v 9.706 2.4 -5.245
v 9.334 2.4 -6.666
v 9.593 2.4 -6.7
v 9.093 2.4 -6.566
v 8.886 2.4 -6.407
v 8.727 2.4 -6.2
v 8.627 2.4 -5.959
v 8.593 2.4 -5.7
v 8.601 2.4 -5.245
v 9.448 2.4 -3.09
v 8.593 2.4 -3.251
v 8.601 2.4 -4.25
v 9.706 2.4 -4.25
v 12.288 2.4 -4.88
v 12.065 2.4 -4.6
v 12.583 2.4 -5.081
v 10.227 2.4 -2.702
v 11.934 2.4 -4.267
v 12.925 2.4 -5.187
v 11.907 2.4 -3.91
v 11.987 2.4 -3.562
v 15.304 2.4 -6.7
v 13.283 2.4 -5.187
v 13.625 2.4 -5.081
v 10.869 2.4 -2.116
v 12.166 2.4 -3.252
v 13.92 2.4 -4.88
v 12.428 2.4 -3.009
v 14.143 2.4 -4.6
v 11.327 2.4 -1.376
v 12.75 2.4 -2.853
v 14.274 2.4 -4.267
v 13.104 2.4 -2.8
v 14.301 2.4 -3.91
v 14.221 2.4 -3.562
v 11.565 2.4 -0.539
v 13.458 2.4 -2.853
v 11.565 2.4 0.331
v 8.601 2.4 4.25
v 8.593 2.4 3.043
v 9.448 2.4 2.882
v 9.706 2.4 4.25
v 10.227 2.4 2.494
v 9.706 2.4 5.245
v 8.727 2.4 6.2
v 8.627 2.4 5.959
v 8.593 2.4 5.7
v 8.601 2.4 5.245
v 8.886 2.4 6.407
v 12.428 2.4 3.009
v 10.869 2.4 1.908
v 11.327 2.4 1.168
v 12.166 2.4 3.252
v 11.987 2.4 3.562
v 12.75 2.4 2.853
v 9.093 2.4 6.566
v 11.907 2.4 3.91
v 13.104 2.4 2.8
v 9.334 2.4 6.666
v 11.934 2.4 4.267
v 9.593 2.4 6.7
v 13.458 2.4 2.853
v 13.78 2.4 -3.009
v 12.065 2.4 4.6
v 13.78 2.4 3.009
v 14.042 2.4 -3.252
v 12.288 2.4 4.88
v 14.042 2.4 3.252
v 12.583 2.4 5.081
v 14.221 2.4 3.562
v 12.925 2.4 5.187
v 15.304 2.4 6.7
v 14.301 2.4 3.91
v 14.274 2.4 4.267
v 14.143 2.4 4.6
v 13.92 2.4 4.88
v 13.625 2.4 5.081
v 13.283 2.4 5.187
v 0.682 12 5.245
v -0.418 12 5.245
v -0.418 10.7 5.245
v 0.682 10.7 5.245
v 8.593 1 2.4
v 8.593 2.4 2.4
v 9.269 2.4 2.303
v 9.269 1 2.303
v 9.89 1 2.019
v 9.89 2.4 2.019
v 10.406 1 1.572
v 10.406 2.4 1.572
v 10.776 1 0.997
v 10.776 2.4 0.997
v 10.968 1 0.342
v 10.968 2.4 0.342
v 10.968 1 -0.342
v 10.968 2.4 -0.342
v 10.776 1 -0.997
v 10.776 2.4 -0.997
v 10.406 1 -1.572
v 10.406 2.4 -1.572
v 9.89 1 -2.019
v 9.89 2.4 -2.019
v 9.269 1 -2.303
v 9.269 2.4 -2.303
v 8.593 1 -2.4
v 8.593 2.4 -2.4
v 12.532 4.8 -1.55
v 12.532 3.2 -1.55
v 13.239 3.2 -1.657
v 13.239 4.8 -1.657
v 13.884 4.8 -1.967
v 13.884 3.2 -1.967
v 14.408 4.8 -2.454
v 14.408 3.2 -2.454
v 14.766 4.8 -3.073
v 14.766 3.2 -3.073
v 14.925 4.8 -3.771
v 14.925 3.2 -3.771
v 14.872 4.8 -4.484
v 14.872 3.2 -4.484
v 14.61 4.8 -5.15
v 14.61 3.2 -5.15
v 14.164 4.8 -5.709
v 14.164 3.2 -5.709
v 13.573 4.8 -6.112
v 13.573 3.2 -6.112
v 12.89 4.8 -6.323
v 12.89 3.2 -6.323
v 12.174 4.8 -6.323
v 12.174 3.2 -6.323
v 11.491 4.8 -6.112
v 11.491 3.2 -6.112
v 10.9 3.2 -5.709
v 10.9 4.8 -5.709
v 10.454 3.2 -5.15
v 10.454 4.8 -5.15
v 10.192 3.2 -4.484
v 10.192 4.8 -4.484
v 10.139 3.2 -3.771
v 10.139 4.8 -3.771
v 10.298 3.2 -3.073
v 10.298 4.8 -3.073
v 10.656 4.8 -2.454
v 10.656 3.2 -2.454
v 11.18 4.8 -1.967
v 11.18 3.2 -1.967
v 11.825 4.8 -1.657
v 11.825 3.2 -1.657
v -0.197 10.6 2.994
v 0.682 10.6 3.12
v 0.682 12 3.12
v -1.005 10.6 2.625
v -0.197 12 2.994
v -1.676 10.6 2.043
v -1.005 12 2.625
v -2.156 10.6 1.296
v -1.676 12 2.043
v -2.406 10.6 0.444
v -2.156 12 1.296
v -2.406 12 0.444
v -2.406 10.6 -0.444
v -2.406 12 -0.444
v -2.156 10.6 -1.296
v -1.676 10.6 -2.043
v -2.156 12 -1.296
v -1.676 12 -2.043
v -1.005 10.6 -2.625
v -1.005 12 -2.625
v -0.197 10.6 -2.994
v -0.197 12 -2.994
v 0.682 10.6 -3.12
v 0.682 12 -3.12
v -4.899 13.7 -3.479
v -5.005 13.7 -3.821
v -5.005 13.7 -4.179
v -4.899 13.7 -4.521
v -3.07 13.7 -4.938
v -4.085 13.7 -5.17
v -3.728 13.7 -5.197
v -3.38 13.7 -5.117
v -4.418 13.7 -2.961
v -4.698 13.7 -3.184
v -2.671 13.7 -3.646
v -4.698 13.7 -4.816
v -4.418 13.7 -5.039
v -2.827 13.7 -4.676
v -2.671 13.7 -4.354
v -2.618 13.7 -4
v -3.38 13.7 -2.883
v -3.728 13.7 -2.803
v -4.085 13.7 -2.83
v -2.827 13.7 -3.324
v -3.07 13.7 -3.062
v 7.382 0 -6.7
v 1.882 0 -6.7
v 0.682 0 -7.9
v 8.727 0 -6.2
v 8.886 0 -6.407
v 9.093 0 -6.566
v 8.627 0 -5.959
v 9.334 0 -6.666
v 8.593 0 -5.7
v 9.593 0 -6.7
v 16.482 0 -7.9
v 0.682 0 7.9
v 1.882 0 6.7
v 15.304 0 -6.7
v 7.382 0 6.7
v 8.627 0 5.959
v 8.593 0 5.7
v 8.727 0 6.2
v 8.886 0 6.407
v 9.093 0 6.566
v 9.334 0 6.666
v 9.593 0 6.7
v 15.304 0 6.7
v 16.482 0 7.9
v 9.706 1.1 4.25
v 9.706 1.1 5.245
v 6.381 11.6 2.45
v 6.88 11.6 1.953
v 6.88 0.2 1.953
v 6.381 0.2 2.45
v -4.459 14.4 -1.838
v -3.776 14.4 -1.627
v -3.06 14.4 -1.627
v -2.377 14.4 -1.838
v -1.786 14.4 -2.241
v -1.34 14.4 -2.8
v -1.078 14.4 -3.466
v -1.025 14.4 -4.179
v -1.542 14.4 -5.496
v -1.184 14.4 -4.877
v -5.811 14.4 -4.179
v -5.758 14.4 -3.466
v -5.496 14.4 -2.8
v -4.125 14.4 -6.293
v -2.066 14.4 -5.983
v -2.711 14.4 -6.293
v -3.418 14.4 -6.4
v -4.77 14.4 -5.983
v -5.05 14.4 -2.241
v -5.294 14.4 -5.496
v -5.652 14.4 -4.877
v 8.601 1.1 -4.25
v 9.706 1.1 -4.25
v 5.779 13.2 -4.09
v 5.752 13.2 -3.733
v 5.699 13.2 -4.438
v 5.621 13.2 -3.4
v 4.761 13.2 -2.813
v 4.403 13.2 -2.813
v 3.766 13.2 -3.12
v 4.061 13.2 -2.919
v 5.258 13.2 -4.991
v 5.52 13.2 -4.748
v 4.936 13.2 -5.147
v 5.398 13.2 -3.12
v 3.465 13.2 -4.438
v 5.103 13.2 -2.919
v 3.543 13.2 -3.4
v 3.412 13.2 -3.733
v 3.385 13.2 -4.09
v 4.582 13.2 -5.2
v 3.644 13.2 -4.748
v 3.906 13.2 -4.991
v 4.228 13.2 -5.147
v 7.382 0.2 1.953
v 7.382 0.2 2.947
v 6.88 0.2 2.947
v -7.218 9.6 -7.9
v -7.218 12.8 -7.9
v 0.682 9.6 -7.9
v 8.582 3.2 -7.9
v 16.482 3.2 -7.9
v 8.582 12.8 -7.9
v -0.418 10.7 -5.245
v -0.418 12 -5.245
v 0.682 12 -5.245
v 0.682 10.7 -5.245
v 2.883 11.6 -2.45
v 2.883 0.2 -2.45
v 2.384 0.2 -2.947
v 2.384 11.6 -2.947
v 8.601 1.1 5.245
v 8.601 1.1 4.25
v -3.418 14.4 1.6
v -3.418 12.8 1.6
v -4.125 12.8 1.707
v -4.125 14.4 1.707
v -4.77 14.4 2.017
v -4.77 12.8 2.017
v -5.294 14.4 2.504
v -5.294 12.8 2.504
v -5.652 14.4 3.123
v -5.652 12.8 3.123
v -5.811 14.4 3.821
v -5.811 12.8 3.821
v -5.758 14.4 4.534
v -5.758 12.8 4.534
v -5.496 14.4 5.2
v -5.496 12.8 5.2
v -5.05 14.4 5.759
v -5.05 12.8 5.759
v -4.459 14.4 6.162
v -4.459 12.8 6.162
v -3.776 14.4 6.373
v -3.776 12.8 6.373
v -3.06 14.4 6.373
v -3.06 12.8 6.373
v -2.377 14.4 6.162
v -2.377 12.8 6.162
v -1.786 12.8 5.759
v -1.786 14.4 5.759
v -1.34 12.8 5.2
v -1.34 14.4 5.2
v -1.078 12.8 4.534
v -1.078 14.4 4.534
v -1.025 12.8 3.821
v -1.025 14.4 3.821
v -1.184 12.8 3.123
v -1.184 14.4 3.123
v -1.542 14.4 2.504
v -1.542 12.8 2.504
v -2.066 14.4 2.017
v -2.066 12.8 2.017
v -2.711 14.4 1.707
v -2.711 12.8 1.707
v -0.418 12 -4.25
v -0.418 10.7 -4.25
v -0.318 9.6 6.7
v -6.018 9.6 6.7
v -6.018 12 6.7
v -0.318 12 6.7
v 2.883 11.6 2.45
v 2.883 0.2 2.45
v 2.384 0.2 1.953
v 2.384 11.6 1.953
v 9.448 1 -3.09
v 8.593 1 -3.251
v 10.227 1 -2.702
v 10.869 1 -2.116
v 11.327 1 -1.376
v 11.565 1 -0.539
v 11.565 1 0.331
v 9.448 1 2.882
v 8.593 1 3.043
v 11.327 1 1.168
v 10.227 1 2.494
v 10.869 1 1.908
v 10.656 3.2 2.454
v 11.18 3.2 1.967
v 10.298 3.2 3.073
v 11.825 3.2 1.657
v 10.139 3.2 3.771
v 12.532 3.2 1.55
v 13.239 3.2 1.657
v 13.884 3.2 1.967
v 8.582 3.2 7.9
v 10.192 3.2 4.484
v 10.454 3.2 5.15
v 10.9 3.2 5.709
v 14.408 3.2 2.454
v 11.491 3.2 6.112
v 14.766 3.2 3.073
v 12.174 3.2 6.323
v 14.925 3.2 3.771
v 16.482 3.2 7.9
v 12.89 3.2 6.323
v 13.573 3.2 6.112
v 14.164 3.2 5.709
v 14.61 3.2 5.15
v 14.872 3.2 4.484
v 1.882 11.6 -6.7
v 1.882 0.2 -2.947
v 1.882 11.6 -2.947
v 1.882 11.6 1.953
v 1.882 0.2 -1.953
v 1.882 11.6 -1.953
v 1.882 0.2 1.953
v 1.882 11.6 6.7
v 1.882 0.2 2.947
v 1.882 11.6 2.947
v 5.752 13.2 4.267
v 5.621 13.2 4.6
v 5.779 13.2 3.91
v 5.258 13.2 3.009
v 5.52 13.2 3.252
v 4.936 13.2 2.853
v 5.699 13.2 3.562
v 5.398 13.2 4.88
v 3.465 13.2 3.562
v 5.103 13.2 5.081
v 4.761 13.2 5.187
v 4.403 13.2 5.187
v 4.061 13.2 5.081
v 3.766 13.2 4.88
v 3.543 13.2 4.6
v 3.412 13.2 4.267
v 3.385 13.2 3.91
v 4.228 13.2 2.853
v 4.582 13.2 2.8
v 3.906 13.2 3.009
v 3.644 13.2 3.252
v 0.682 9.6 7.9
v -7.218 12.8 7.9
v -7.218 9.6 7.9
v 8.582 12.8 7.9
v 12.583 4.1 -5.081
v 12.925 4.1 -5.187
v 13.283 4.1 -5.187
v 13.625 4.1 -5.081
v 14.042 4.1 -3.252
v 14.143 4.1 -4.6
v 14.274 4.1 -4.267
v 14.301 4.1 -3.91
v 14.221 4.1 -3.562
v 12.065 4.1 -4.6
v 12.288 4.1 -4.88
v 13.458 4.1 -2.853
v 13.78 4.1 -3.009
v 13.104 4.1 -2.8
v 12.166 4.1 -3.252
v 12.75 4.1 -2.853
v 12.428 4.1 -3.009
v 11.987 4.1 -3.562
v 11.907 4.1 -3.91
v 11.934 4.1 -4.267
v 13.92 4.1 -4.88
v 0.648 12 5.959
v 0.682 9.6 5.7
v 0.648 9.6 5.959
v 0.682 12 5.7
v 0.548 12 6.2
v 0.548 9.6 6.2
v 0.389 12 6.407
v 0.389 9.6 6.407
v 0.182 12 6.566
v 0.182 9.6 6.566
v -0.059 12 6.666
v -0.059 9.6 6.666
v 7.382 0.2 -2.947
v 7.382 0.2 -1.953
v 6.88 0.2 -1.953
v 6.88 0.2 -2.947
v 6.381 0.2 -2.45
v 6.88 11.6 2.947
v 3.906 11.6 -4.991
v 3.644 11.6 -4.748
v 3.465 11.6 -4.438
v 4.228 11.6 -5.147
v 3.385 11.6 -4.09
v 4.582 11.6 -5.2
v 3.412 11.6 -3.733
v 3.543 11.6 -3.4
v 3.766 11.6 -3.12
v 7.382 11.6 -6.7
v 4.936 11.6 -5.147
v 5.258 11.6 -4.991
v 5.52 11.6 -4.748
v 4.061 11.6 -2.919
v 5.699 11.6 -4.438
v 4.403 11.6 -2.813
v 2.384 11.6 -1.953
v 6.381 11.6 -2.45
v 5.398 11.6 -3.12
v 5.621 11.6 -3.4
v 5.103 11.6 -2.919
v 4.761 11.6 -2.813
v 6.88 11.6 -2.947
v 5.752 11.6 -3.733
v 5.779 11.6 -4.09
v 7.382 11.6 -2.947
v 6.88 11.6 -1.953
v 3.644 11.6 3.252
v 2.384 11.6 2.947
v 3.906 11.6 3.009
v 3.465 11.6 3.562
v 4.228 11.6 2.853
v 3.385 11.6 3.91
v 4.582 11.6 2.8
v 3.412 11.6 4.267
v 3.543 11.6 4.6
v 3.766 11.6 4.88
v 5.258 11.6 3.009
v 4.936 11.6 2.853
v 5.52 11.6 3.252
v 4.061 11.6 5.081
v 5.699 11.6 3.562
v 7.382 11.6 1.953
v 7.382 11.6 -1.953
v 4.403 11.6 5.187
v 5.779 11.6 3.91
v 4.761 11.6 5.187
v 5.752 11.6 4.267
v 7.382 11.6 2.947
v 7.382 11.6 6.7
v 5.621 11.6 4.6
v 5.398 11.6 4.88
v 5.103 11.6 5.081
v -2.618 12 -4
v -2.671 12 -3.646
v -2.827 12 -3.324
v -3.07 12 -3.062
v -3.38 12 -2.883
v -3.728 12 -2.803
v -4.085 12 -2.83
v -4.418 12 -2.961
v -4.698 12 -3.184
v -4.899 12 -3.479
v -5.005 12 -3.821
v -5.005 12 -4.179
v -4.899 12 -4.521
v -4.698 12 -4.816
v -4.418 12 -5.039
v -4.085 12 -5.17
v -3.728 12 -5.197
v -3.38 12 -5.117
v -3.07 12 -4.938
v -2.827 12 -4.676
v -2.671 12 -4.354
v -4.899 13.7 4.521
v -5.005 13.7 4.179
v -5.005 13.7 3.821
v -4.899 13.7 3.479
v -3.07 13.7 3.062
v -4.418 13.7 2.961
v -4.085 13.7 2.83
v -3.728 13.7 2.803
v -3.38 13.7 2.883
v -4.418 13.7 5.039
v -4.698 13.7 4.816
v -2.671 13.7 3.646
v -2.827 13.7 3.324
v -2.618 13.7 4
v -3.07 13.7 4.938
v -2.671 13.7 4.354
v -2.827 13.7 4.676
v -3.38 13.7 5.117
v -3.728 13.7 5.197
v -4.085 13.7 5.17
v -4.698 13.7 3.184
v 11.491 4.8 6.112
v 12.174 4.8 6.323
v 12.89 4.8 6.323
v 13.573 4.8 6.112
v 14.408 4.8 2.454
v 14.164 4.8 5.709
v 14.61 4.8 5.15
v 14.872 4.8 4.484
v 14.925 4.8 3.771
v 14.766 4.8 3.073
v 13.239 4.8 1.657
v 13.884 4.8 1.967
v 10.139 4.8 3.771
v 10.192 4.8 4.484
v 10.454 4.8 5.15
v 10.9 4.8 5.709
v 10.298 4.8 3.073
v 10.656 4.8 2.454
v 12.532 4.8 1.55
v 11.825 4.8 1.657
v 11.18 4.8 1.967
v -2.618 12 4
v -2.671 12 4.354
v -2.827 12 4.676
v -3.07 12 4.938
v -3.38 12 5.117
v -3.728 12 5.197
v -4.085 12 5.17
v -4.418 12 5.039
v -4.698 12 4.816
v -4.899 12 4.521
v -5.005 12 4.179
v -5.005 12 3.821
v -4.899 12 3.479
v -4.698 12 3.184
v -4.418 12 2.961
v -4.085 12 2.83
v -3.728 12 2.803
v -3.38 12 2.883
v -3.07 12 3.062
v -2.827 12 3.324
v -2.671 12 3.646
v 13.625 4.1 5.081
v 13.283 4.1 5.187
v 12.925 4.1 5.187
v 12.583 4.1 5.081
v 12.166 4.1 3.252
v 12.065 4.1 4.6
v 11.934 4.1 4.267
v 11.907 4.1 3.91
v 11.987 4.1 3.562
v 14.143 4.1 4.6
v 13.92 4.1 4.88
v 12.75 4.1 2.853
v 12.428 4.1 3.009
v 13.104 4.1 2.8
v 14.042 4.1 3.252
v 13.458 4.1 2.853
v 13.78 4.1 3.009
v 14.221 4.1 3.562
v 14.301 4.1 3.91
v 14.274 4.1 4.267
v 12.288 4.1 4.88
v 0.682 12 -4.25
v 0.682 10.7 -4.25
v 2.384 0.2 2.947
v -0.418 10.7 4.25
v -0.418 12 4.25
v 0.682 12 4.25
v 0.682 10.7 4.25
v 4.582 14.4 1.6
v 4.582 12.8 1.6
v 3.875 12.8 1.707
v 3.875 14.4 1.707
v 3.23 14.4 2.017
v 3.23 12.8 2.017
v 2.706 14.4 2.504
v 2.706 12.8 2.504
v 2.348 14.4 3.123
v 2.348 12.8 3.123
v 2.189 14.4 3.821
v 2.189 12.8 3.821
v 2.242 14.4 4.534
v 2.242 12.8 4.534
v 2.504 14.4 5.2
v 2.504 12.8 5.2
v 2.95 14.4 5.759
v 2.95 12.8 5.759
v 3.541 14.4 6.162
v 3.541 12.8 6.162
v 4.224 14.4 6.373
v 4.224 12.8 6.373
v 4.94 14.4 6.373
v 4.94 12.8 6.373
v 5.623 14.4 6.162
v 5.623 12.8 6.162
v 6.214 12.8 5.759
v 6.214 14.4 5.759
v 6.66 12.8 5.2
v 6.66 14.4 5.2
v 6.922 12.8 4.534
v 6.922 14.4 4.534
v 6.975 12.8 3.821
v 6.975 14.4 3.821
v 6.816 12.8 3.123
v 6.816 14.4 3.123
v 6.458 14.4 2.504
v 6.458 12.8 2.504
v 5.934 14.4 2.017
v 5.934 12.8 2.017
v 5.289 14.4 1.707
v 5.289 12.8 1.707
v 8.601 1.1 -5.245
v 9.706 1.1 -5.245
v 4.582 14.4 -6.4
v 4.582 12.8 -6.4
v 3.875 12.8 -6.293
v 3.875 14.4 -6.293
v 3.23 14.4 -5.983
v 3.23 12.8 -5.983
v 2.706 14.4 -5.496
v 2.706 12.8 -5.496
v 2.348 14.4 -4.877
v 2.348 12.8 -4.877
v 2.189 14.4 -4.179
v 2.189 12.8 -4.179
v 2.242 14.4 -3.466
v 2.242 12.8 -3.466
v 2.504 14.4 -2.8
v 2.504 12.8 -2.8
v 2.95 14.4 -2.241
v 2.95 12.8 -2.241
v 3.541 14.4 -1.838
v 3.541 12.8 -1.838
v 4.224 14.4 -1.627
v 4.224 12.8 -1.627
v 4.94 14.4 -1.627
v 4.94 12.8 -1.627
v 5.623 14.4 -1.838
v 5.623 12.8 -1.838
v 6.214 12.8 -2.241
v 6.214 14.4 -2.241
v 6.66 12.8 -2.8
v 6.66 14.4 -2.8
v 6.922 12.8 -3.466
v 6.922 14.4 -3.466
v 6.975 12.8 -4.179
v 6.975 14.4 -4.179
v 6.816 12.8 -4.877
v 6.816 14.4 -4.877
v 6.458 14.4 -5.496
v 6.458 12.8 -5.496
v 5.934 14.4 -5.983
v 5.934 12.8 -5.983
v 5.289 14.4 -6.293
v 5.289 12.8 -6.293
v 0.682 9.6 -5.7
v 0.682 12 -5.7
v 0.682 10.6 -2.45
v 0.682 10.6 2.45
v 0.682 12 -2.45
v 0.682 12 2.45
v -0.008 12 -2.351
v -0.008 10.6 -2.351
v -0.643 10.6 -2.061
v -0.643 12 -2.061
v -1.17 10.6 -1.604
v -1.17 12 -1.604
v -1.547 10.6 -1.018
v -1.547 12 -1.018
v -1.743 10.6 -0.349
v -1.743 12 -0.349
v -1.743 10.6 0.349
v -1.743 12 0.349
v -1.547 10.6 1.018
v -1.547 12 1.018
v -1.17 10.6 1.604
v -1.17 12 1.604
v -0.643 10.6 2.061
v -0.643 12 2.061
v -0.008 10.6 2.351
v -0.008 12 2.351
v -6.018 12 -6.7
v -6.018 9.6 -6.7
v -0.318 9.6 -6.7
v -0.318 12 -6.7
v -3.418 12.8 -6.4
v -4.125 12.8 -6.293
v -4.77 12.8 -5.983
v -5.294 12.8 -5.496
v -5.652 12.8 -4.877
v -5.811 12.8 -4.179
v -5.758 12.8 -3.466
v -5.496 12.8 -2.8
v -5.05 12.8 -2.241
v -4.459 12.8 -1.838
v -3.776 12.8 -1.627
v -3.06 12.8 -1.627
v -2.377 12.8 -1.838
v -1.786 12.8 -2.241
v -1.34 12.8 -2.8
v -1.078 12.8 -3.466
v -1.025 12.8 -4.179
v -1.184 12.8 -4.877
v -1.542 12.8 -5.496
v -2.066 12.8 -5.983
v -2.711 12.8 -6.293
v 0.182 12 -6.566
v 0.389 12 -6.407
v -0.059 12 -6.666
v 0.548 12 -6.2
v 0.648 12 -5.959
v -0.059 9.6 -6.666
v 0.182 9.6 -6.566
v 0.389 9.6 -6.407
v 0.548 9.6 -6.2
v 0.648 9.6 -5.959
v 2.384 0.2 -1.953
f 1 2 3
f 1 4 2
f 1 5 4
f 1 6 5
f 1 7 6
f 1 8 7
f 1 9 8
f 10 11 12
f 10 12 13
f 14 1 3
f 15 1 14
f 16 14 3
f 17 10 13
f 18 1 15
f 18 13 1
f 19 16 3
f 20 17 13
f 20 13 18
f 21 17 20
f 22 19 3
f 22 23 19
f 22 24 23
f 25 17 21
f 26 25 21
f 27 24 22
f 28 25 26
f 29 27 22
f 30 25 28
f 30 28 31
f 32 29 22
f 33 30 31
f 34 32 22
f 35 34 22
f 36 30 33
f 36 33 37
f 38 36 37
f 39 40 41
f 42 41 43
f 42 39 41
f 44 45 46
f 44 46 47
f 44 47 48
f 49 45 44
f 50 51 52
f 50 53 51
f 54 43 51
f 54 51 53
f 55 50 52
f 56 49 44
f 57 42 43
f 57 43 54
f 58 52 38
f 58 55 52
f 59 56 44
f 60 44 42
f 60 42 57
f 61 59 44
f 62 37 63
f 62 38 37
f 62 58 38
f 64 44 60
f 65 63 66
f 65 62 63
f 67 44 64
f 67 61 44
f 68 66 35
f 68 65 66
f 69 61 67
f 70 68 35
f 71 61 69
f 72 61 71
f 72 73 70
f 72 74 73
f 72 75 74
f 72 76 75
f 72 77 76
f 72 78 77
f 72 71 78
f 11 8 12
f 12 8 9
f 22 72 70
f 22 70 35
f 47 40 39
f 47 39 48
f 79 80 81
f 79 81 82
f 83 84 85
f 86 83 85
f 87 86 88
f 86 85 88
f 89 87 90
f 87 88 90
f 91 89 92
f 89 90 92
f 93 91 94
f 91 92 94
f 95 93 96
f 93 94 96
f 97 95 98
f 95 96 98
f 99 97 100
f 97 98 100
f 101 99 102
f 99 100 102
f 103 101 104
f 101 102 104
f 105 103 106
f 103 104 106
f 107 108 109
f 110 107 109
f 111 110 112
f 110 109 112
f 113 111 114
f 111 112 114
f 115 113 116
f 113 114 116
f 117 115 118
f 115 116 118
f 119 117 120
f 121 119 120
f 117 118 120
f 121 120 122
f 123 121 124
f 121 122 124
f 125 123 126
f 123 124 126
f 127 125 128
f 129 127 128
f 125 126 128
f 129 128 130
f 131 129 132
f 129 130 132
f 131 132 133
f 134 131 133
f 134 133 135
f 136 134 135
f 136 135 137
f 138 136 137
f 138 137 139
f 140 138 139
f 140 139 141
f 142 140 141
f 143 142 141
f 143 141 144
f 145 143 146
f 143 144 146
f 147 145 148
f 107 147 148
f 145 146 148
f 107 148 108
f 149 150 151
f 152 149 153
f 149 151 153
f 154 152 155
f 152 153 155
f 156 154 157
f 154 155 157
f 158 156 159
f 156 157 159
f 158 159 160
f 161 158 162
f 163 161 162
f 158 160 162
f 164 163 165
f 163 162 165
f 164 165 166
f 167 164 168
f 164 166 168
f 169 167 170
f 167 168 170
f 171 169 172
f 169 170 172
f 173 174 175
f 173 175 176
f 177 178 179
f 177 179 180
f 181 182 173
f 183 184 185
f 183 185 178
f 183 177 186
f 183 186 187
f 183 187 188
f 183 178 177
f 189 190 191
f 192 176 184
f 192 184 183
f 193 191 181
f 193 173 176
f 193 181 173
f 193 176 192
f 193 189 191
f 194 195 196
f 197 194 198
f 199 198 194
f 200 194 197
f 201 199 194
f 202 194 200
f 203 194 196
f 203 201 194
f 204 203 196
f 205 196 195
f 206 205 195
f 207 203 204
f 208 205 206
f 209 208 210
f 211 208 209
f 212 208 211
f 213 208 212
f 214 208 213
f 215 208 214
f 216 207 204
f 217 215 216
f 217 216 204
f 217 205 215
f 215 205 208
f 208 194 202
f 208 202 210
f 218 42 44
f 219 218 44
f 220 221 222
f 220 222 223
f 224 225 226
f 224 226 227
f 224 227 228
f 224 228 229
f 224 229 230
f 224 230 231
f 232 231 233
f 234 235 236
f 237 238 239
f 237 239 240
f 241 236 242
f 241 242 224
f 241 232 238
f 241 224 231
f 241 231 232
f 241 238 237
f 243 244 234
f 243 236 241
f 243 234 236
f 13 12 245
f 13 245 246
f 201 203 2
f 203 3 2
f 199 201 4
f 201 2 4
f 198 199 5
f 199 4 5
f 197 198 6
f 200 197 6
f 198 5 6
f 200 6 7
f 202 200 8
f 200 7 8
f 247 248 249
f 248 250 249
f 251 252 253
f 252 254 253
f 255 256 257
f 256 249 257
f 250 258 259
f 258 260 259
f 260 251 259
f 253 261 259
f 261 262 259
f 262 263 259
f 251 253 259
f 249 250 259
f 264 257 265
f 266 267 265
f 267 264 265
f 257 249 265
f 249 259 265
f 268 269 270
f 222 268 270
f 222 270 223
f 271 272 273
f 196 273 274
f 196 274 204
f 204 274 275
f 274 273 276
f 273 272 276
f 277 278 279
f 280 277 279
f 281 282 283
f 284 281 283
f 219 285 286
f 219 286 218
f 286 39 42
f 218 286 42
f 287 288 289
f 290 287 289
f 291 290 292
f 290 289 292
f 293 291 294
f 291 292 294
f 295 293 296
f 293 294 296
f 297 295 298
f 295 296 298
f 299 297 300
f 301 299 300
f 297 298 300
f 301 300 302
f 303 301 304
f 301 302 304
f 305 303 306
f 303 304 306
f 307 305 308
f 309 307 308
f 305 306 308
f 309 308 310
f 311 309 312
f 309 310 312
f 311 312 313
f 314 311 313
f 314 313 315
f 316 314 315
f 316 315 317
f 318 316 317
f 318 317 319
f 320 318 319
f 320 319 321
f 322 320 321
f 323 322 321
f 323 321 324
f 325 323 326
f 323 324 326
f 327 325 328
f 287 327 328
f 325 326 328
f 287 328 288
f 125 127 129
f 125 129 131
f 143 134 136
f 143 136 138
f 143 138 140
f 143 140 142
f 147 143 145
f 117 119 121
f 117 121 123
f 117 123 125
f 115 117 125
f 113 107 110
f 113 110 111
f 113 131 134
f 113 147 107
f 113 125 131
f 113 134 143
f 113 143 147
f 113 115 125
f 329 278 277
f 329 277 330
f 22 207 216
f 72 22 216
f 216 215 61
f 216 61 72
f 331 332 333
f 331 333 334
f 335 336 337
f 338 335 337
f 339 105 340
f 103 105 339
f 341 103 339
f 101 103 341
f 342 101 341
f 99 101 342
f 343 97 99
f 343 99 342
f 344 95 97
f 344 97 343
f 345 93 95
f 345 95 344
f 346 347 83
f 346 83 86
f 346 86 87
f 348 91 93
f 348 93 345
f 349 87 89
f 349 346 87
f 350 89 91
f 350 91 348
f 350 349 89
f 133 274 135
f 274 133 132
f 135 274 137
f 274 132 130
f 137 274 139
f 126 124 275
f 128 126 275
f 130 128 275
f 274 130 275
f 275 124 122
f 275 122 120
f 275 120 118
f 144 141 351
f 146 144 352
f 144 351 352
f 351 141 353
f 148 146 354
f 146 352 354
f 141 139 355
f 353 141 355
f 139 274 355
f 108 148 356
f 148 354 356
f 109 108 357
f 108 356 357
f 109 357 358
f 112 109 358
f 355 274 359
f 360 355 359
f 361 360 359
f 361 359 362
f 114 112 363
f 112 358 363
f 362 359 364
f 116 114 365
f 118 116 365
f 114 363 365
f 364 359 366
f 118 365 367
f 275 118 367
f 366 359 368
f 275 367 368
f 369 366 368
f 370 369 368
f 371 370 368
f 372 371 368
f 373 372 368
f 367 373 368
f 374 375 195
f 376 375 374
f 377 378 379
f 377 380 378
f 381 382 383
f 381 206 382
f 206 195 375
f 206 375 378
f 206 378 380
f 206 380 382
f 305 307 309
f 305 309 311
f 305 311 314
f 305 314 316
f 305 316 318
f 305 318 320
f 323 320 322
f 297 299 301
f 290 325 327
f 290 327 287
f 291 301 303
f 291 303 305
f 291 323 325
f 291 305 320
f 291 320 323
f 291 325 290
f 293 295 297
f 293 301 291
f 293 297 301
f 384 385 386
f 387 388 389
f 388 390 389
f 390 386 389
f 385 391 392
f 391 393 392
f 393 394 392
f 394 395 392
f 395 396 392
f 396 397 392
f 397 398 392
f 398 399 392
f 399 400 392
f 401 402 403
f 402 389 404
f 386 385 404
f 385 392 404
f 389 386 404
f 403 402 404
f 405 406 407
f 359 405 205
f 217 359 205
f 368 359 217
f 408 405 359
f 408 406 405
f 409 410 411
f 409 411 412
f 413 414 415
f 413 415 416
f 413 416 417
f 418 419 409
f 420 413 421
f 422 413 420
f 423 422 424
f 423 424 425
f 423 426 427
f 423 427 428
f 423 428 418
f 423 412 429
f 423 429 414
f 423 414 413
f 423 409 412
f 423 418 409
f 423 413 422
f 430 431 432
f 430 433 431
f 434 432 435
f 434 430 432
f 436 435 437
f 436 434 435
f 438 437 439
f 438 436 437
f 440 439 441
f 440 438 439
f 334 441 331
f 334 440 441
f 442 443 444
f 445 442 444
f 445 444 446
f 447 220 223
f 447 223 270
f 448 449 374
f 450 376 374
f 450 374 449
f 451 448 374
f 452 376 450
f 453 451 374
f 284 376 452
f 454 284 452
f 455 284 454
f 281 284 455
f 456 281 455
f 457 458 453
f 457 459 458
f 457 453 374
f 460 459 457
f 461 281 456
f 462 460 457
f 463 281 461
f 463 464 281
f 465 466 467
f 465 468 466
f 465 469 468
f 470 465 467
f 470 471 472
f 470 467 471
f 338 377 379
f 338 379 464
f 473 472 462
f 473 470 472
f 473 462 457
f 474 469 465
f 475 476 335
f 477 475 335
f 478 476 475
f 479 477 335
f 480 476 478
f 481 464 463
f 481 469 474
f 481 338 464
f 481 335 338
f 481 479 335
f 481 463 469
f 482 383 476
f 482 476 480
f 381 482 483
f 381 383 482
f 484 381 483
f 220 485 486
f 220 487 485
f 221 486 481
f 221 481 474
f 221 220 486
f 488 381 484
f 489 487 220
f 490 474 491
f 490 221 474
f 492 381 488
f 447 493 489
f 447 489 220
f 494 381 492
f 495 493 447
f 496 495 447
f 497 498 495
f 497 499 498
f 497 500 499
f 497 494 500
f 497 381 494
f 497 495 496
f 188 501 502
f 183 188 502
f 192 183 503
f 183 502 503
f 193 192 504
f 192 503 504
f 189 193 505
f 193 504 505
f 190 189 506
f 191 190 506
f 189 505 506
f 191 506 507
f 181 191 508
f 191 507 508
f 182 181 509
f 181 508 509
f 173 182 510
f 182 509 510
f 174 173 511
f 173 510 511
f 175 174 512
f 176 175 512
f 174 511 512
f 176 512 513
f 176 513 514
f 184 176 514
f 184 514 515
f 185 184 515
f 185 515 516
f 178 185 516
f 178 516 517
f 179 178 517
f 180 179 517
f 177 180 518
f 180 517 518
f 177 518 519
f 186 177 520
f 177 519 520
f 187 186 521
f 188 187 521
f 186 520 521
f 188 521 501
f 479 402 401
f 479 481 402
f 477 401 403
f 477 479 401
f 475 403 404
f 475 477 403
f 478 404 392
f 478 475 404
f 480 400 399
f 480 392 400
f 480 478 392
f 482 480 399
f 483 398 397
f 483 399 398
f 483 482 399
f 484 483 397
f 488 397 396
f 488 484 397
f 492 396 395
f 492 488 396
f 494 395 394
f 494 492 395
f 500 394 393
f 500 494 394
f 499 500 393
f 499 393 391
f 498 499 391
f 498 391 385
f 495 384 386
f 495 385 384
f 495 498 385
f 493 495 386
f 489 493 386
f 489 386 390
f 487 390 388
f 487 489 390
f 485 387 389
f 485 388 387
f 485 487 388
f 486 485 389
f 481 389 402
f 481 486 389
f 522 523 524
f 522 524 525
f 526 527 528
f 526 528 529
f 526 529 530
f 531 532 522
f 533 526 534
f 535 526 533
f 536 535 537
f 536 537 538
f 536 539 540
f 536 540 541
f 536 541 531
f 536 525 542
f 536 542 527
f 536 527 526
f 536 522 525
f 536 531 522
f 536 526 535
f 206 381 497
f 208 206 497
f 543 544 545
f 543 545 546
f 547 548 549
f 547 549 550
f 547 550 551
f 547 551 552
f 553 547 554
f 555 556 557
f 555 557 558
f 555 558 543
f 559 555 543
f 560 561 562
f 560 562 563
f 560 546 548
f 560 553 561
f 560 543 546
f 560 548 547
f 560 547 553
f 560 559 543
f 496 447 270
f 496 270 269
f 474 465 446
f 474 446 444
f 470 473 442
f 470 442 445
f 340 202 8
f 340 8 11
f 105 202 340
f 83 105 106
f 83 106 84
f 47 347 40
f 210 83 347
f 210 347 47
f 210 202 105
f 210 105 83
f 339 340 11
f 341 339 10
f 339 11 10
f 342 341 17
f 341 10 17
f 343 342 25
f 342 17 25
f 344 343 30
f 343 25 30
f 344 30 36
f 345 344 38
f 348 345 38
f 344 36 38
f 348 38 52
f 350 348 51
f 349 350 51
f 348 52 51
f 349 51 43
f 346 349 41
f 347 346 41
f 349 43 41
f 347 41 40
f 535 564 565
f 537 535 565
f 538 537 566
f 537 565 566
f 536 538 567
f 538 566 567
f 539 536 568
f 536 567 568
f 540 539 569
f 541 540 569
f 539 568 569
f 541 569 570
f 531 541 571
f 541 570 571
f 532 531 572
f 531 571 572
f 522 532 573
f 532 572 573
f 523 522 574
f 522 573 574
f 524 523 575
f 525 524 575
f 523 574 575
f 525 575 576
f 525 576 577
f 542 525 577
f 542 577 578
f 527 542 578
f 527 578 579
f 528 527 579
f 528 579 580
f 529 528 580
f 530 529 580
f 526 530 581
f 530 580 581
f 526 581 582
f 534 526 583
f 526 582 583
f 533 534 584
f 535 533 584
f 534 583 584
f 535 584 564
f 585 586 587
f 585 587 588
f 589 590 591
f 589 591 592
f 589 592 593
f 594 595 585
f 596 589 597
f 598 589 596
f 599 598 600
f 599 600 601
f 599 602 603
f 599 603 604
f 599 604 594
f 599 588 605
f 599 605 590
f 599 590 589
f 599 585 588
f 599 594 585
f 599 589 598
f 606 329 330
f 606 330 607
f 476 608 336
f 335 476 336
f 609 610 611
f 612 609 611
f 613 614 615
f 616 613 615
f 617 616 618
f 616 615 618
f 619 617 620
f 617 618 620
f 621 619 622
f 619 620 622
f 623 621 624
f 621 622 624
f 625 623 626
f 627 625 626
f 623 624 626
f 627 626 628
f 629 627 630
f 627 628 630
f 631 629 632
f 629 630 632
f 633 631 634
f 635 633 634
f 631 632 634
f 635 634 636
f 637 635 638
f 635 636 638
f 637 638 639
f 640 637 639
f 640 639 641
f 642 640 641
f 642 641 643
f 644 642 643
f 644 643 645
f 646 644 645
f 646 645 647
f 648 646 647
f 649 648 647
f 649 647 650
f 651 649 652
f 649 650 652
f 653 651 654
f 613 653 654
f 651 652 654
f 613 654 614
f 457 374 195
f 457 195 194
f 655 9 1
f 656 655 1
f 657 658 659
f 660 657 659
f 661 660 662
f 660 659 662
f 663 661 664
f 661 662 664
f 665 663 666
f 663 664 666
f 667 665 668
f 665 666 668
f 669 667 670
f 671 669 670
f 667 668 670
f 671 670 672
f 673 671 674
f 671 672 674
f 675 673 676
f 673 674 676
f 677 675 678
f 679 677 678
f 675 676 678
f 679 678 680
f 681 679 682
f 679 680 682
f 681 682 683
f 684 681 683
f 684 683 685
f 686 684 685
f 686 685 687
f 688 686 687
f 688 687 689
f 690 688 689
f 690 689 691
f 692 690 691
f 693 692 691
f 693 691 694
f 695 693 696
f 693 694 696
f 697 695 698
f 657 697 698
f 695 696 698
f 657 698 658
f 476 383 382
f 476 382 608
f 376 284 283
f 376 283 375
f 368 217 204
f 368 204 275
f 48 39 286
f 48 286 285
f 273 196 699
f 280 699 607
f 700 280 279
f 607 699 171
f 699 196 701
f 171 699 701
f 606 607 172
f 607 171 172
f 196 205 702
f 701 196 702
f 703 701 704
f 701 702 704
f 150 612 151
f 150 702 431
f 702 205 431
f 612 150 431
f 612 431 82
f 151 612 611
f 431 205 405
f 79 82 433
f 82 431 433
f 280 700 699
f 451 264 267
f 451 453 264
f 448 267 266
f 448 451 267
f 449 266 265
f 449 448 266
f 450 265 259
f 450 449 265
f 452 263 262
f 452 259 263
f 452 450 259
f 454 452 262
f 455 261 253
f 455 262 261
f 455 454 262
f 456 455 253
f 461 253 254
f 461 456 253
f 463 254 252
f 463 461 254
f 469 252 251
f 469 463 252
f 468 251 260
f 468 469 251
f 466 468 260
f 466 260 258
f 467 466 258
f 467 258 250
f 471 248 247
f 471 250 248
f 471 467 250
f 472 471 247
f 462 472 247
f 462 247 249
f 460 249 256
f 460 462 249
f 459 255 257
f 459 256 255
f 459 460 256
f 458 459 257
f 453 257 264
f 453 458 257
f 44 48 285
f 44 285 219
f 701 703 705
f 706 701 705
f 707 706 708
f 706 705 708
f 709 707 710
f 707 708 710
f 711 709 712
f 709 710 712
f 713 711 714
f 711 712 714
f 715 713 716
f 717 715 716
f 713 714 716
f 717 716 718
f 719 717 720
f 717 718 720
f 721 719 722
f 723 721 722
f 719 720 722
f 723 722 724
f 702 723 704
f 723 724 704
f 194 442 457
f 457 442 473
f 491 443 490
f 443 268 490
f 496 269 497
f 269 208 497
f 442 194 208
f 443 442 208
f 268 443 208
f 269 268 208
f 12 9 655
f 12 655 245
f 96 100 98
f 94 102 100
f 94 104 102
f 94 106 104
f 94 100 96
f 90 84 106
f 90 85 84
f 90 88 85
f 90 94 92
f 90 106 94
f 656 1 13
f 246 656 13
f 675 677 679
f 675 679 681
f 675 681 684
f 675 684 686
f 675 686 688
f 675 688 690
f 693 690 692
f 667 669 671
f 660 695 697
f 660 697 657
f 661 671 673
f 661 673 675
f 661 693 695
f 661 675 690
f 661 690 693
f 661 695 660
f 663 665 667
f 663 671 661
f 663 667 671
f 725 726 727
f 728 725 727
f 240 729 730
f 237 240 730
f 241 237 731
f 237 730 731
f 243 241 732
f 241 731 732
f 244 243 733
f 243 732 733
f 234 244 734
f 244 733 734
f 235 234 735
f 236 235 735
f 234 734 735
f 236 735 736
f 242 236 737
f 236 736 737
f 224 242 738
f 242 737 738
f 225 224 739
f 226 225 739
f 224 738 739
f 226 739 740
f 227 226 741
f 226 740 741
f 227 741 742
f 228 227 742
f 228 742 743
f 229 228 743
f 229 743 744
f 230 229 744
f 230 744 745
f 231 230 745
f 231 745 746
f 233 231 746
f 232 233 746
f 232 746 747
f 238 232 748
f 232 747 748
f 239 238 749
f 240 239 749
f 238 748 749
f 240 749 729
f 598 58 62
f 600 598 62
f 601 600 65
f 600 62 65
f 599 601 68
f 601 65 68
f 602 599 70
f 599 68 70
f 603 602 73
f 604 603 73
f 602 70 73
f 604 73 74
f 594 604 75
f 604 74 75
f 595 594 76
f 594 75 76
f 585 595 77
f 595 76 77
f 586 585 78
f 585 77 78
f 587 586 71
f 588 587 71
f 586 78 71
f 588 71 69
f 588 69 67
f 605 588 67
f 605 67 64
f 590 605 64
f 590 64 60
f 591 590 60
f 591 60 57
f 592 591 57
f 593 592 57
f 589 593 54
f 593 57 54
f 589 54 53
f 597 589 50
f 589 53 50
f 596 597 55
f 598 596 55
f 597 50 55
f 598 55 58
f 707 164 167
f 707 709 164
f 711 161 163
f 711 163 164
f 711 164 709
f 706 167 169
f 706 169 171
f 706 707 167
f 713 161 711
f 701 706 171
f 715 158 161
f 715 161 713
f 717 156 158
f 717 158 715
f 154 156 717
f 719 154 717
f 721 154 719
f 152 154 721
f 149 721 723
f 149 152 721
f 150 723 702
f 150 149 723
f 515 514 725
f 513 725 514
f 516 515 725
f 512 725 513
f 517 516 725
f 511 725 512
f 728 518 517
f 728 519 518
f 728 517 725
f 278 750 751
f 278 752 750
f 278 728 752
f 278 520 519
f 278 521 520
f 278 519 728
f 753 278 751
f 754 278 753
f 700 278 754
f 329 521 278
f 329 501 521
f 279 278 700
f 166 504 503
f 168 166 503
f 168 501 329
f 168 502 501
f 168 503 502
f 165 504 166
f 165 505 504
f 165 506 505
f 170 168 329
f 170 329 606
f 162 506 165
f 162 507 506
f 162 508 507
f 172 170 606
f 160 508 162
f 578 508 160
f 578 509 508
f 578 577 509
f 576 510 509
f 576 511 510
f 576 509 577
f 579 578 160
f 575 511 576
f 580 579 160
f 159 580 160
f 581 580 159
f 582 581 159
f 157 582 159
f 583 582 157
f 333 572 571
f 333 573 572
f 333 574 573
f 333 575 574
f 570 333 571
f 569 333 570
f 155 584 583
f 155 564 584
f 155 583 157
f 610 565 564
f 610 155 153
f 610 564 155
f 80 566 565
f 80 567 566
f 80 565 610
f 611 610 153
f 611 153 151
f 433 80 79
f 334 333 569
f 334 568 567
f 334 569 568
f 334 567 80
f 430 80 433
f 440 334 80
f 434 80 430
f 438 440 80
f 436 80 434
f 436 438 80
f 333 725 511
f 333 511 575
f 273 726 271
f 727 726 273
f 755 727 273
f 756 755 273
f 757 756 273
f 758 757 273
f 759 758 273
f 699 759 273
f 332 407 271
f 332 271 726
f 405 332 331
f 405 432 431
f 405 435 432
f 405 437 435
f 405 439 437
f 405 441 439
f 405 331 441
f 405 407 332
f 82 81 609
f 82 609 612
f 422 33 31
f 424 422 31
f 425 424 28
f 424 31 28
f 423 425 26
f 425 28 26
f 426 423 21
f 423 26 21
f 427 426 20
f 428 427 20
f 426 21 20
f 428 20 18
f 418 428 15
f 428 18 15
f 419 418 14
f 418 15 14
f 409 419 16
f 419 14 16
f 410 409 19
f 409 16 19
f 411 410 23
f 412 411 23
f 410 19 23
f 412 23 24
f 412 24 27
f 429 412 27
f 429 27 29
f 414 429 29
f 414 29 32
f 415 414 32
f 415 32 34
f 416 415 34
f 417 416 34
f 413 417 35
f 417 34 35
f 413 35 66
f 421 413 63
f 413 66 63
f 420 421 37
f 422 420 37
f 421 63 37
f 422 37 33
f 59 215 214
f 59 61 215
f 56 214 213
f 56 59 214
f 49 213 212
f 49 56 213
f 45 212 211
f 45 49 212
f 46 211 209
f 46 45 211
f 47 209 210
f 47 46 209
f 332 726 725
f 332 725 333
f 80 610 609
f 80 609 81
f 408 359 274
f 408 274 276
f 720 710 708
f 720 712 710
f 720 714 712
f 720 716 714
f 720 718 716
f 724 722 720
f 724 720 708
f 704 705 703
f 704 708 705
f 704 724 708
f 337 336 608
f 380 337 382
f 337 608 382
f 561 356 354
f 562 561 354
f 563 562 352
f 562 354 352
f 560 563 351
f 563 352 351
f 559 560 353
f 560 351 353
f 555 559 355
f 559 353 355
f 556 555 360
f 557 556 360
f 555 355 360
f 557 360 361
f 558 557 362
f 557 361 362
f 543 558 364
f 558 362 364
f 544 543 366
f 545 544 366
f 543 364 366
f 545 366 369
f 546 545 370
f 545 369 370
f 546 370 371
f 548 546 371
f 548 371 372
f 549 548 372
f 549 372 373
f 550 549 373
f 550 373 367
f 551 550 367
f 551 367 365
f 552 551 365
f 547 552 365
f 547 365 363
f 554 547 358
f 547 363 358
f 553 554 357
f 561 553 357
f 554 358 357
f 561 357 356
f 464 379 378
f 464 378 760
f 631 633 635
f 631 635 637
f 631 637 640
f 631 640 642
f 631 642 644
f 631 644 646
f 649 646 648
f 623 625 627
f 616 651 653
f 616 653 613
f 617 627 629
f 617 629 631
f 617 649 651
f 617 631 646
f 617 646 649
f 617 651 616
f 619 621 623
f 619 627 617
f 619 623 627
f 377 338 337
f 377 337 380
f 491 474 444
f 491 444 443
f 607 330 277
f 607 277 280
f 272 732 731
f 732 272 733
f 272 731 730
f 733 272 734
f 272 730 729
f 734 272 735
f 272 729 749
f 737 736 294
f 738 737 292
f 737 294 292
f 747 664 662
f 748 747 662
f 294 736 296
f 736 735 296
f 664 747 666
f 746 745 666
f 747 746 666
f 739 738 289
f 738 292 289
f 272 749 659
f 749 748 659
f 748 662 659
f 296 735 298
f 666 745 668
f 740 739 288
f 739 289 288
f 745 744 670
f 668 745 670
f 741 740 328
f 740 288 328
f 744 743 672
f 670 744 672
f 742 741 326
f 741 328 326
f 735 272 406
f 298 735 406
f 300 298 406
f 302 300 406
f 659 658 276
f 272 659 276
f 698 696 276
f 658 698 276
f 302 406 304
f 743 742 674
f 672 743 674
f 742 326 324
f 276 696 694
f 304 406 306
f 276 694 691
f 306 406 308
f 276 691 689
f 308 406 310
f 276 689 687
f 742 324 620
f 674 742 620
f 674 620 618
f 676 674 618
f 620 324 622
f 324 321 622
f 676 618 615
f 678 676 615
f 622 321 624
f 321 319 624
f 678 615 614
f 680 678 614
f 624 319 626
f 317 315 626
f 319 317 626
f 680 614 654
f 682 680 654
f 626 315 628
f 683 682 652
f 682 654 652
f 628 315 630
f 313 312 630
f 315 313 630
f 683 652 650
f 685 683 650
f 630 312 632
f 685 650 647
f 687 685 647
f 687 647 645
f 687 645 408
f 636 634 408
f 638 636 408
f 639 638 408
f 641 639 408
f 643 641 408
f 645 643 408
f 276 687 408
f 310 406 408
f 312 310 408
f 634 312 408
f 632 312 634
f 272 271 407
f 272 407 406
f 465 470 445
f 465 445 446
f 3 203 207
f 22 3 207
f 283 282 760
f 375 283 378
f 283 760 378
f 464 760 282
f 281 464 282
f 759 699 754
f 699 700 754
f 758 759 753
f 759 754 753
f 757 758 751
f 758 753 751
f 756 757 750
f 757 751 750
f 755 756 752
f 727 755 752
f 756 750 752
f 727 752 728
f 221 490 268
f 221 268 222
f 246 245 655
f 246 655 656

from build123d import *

# Parameters (mm, degrees)
MAINBASESKETCH_W                = 7.9
MAINBASESKETCH_H                = 12.8
MAINBASEEXTRUDE_DEPTH           = 7.9
STUDSSKETCH_R                   = 2.4
STUDSEXTRUDE_DEPTH              = 1.6
STUDSPATTERN_COUNT              = 2
STUDSPATTERN_PITCH              = 8
MAINBASESHELL_T                 = -1.2
SLIMYELLOWUNDEREXT_START        = -0.2
SLIMYELLOWUNDEREXT_DEPTH        = 11.6
ZIGZAGSKETCH_W                  = 7.9
ZIGZAGSKETCH_H                  = 3.2
ZIGZAGBLUEEXT_DEPTH             = 15.8
LPATTERN1_COUNT                 = 2
LPATTERN1_PITCH                 = 8
LPATTERN1_COPY_1_SKETCH_R       = 2.4
LPATTERN1_COPY_1_DEPTH          = 1.6
ZIGZAGSTUDSKETCH_R              = 2.4
ADDEDSTUDSZIGZAG_DEPTH          = 1.6
CUTUSEDASSHELLSKETCH_W          = 6.71130504
CUTUSEDASSHELLSKETCH_H          = 13.400349982
CUTUSEDASSHELL_DEPTH            = 2.4
ZIGZAGUNDERSTUDSSKETCH_R        = 1.2
ZIGZAGUNDERSTUDHOLES_DEPTH      = 1.7
ZIGZAGUNDERSEMICIRCLEEXT_START  = -0.2
ZIGZAGUNDERSEMICIRCLEEXT_DEPTH  = 1.6
CUTUSEDASSHELLSKETCH2_W         = 6.7
CUTUSEDASSHELLSKETCH2_H         = 13.4
CUTUSEDASSHELL2_DEPTH           = 2.4
ZIGZAGUNDERSEMICEXT2_START      = -0.2
ZIGZAGUNDERSEMICEXT2_DEPTH      = 1.6
ZIGZAGINSIDECORNER1_R           = 1
ZIGZAGINSIDECORNER2_R           = 1
ZIGZAGUNDERSTUDSKETCH2_R        = 1.2
CUT_EXTRUDE1_DEPTH              = 1.7
RECTANGULARUNDEREXTRUDES1_START = -0.2
RECTANGULAREXTSKETCH_W          = 1.100347559
RECTANGULAREXTSKETCH_H          = 0.995198726
RECTANGULARUNDEREXTRUDES1_DEPTH = 1.5
RECTANGULARUNDEREXTRUDES2_START = -0.2
RECTANGULARUNDEREXTSKETCH2_W    = 1.105292793
RECTANGULARUNDEREXTSKETCH2_H    = 0.995198726
RECTANGULARUNDEREXTRUDES2_DEPTH = 1.5


with BuildPart() as part:
    # MainBaseSketch → MainBaseExtrude (new, symmetric)
    with BuildSketch(Plane.XY):
        with Locations((4.631967213, 6.4)):
            Rectangle(MAINBASESKETCH_W, MAINBASESKETCH_H)
    extrude(amount=MAINBASEEXTRUDE_DEPTH, both=True)

    # StudsSketch → StudsExtrude (add)
    with BuildSketch(Plane(origin=(0, 12.8, 0), x_dir=(1, 0, 0), z_dir=(0, 1, 0))):
        with Locations(Location((4.581967213, 4, 0), (0, 0, 90))):
            Circle(STUDSSKETCH_R)
    studsextrude = extrude(amount=STUDSEXTRUDE_DEPTH)

    # StudsPattern: StudsExtrude ×2
    with Locations(*[(0, 0, i * STUDSPATTERN_PITCH) for i in range(1, STUDSPATTERN_COUNT)]):
        add(studsextrude)

    # MainBaseShell
    mainbaseshell_openings = [part.faces().sort_by_distance(p)[0] for p in [
        (4.631967213, 0, 0),
    ]]
    offset(amount=MAINBASESHELL_T, openings=mainbaseshell_openings, kind=Kind.INTERSECTION)

    # SlimYellowUnderExtSketch → SlimYellowUnderExt (add)
    with BuildSketch(Plane.XZ.offset(-11.6).offset(SLIMYELLOWUNDEREXT_START)):
        Polygon((1.881967213, 1.952811318), (1.881967213, 2.947188682), (2.384104441, 2.947188682), (2.882626102, 2.45), (2.384104441, 1.952811318), align=None)
        Polygon((6.381308324, 2.45), (6.879829986, 2.947188682), (7.381967213, 2.947188682), (7.381967213, 1.952811318), (6.879829986, 1.952811318), align=None)
        Polygon((1.881967213, -1.952811318), (2.384104441, -1.952811318), (2.882626102, -2.45), (2.384104441, -2.947188682), (1.881967213, -2.947188682), align=None)
        Polygon((7.381967213, -1.952811318), (7.381967213, -2.947188682), (6.879829986, -2.947188682), (6.381308324, -2.45), (6.879829986, -1.952811318), align=None)
    extrude(amount=SLIMYELLOWUNDEREXT_DEPTH)

    # ZigZagSketch → ZIGZAGBlueExt (add)
    with BuildSketch(Plane.XY.offset(7.9)):
        with Locations((-3.268032787, 11.2)):
            Rectangle(ZIGZAGSKETCH_W, ZIGZAGSKETCH_H)
        with Locations((12.531967213, 1.6)):
            Rectangle(ZIGZAGSKETCH_W, ZIGZAGSKETCH_H)
    extrude(amount=-ZIGZAGBLUEEXT_DEPTH)

    # LPattern1: StudsExtrude ×2
    with Locations(*[(-i * LPATTERN1_PITCH, 0, 0) for i in range(1, LPATTERN1_COUNT)]):
        add(studsextrude)

    # LPattern1 copy 1 sketch → LPattern1 copy 1 (add)
    with BuildSketch(Plane(origin=(-8, 12.8, 8), x_dir=(1, 0, 0), z_dir=(0, 1, 0))):
        with Locations(Location((4.581967213, 4, 0), (0, 0, 90))):
            Circle(LPATTERN1_COPY_1_SKETCH_R)
    extrude(amount=LPATTERN1_COPY_1_DEPTH)

    # ZigZagStudSketch → AddedStudsZigZag (add)
    with BuildSketch(Plane(origin=(0, 3.2, 0), x_dir=(1, 0, 0), z_dir=(0, 1, 0))):
        with Locations(Location((12.531967213, 3.95, 0), (0, 0, 270))):
            Circle(ZIGZAGSTUDSKETCH_R)
        with Locations(Location((12.531967213, -3.95, 0), (0, 0, 90))):
            Circle(ZIGZAGSTUDSKETCH_R)
    extrude(amount=ADDEDSTUDSZIGZAG_DEPTH)

    # CutUsedAsShellSketch → CutUsedasShell (cut)
    with BuildSketch(Plane.XZ):
        with Locations((11.948290767, 0)):
            Rectangle(CUTUSEDASSHELLSKETCH_W, CUTUSEDASSHELLSKETCH_H)
    extrude(amount=-CUTUSEDASSHELL_DEPTH, mode=Mode.SUBTRACT)

    # ZigZagUnderStudsSketch → ZigZagUnderStudHoles (cut)
    with BuildSketch(Plane.XZ.offset(-2.4)):
        with Locations(Location((13.103943287, 4, 0), (0, 0, 270))):
            Circle(ZIGZAGUNDERSTUDSSKETCH_R)
        with Locations(Location((13.103943287, -4, 0), (0, 0, 90))):
            Circle(ZIGZAGUNDERSTUDSSKETCH_R)
    extrude(amount=-ZIGZAGUNDERSTUDHOLES_DEPTH, mode=Mode.SUBTRACT)

    # ZigZAgUNderSemiCSketch → ZigZagUnderSemiCircleExt (add)
    with BuildSketch(Plane.XZ.offset(-2.4).offset(ZIGZAGUNDERSEMICIRCLEEXT_START)):
        with BuildLine():
            ThreePointArc((8.592638247, -3.25057639), (11.595624855, -0.104008885), (8.592638247, 3.04255862))
            Line((8.592638247, 3.04255862), (8.592638247, 2.4))
            ThreePointArc((8.592638247, 2.4), (10.992638247, 0), (8.592638247, -2.4))
            Line((8.592638247, -2.4), (8.592638247, -2.40057639))
            Line((8.592638247, -2.40057639), (8.592638247, -3.25057639))
        make_face()
    extrude(amount=ZIGZAGUNDERSEMICIRCLEEXT_DEPTH)

    # CutUsedAsShellSketch2 → CutUsedAsShell2 (cut)
    with BuildSketch(Plane.XZ.offset(-9.6)):
        with Locations((-2.668032787, 0)):
            Rectangle(CUTUSEDASSHELLSKETCH2_W, CUTUSEDASSHELLSKETCH2_H)
    extrude(amount=-CUTUSEDASSHELL2_DEPTH, mode=Mode.SUBTRACT)

    # ZigZagUnderSemiCExtSketch → ZigZagUnderSemiCExt2 (add)
    with BuildSketch(Plane.XZ.offset(-12).offset(ZIGZAGUNDERSEMICEXT2_START)):
        with BuildLine():
            Line((0.681967213, -3.12), (0.681967213, -2.45))
            ThreePointArc((0.681967213, -2.45), (-1.768032787, 0), (0.681967213, 2.45))
            Line((0.681967213, 2.45), (0.681967213, 3.12))
            ThreePointArc((0.681967213, 3.12), (-2.438032787, 0), (0.681967213, -3.12))
        make_face()
    extrude(amount=ZIGZAGUNDERSEMICEXT2_DEPTH)

    # ZigZagInsideCorner1
    zigzaginsidecorner1_edges = [part.edges().sort_by_distance(p)[0] for p in [
        (8.592638247, 1.2, -6.700174991),
        (8.592638247, 1.2, 6.700174991),
    ]]
    fillet(zigzaginsidecorner1_edges, radius=ZIGZAGINSIDECORNER1_R)

    # ZigZagInsideCorner2
    zigzaginsidecorner2_edges = [part.edges().sort_by_distance(p)[0] for p in [
        (0.681967213, 10.8, -6.7),
        (0.681967213, 10.8, 6.7),
    ]]
    fillet(zigzaginsidecorner2_edges, radius=ZIGZAGINSIDECORNER2_R)

    # ZigZagUnderStudSketch2 → Cut-Extrude1 (cut)
    with BuildSketch(Plane.XZ.offset(-12)):
        with Locations((-3.818032787, 4)):
            Circle(ZIGZAGUNDERSTUDSKETCH2_R)
        with Locations((-3.818032787, -4)):
            Circle(ZIGZAGUNDERSTUDSKETCH2_R)
    extrude(amount=-CUT_EXTRUDE1_DEPTH, mode=Mode.SUBTRACT)

    # RectangularExtSketch → RectangularUnderExtrudes1 (add)
    with BuildSketch(Plane.XZ.offset(-12).offset(RECTANGULARUNDEREXTRUDES1_START)):
        with Locations((0.131793434, 4.747212315)):
            Rectangle(RECTANGULAREXTSKETCH_W, RECTANGULAREXTSKETCH_H)
        with Locations((0.131793434, -4.747212315)):
            Rectangle(RECTANGULAREXTSKETCH_W, RECTANGULAREXTSKETCH_H)
    extrude(amount=RECTANGULARUNDEREXTRUDES1_DEPTH)

    # RectangularUnderExtSketch2 → RectangularUnderExtrudes2 (add)
    with BuildSketch(Plane.XZ.offset(-2.4).offset(RECTANGULARUNDEREXTRUDES2_START)):
        with Locations((9.153257665, 4.747212315)):
            Rectangle(RECTANGULARUNDEREXTSKETCH2_W, RECTANGULARUNDEREXTSKETCH2_H)
        with Locations((9.153257665, -4.747212315)):
            Rectangle(RECTANGULARUNDEREXTSKETCH2_W, RECTANGULARUNDEREXTSKETCH2_H)
    extrude(amount=RECTANGULARUNDEREXTRUDES2_DEPTH)


solid = part.part
